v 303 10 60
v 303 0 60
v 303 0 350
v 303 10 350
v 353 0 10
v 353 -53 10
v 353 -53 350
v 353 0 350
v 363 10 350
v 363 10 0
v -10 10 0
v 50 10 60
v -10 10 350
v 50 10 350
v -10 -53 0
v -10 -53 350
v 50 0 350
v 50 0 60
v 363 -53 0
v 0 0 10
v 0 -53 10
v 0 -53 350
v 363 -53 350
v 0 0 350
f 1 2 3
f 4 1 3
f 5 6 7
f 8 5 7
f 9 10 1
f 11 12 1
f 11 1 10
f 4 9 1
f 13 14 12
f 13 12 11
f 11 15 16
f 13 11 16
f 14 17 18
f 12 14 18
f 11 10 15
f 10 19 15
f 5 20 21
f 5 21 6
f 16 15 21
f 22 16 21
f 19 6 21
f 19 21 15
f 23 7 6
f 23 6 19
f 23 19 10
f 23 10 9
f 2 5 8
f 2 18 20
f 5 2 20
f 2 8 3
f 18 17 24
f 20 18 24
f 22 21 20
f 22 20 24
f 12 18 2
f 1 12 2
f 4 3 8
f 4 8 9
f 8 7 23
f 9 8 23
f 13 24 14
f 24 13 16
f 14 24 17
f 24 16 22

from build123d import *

# Parameters (mm, degrees)
F0_W     = 353
F0_H     = 10
F1_DEPTH = 53
F2_W     = 10
F2_H     = 350
F3_DEPTH = 63
F5_DEPTH = 10


with BuildPart() as f1:
    # F0 (on Front) → F1 (new body)
    with BuildSketch(Plane.XZ):
        with Locations((176.5, 5)):
            Rectangle(F0_W, F0_H)
    extrude(amount=F1_DEPTH)

    # F2 (on face) → F3 (join)
    with BuildSketch(Plane.XZ.offset(53)):
        with Locations((358, 175)):
            Rectangle(F2_W, F2_H)
        with Locations((-5, 175)):
            Rectangle(F2_W, F2_H)
    extrude(amount=-F3_DEPTH)

    # F4 (on face) → F5 (join)
    with BuildSketch(Plane(origin=(0, 0, 0), x_dir=(-1, 0, 0), z_dir=(0, 1, 0))):
        Polygon((-353, 0), (0, 0), (0, 350), (-50, 350), (-50, 60), (-303, 60), (-303, 350), (-353, 350), align=None)
    extrude(amount=F5_DEPTH)


solid = f1.part
